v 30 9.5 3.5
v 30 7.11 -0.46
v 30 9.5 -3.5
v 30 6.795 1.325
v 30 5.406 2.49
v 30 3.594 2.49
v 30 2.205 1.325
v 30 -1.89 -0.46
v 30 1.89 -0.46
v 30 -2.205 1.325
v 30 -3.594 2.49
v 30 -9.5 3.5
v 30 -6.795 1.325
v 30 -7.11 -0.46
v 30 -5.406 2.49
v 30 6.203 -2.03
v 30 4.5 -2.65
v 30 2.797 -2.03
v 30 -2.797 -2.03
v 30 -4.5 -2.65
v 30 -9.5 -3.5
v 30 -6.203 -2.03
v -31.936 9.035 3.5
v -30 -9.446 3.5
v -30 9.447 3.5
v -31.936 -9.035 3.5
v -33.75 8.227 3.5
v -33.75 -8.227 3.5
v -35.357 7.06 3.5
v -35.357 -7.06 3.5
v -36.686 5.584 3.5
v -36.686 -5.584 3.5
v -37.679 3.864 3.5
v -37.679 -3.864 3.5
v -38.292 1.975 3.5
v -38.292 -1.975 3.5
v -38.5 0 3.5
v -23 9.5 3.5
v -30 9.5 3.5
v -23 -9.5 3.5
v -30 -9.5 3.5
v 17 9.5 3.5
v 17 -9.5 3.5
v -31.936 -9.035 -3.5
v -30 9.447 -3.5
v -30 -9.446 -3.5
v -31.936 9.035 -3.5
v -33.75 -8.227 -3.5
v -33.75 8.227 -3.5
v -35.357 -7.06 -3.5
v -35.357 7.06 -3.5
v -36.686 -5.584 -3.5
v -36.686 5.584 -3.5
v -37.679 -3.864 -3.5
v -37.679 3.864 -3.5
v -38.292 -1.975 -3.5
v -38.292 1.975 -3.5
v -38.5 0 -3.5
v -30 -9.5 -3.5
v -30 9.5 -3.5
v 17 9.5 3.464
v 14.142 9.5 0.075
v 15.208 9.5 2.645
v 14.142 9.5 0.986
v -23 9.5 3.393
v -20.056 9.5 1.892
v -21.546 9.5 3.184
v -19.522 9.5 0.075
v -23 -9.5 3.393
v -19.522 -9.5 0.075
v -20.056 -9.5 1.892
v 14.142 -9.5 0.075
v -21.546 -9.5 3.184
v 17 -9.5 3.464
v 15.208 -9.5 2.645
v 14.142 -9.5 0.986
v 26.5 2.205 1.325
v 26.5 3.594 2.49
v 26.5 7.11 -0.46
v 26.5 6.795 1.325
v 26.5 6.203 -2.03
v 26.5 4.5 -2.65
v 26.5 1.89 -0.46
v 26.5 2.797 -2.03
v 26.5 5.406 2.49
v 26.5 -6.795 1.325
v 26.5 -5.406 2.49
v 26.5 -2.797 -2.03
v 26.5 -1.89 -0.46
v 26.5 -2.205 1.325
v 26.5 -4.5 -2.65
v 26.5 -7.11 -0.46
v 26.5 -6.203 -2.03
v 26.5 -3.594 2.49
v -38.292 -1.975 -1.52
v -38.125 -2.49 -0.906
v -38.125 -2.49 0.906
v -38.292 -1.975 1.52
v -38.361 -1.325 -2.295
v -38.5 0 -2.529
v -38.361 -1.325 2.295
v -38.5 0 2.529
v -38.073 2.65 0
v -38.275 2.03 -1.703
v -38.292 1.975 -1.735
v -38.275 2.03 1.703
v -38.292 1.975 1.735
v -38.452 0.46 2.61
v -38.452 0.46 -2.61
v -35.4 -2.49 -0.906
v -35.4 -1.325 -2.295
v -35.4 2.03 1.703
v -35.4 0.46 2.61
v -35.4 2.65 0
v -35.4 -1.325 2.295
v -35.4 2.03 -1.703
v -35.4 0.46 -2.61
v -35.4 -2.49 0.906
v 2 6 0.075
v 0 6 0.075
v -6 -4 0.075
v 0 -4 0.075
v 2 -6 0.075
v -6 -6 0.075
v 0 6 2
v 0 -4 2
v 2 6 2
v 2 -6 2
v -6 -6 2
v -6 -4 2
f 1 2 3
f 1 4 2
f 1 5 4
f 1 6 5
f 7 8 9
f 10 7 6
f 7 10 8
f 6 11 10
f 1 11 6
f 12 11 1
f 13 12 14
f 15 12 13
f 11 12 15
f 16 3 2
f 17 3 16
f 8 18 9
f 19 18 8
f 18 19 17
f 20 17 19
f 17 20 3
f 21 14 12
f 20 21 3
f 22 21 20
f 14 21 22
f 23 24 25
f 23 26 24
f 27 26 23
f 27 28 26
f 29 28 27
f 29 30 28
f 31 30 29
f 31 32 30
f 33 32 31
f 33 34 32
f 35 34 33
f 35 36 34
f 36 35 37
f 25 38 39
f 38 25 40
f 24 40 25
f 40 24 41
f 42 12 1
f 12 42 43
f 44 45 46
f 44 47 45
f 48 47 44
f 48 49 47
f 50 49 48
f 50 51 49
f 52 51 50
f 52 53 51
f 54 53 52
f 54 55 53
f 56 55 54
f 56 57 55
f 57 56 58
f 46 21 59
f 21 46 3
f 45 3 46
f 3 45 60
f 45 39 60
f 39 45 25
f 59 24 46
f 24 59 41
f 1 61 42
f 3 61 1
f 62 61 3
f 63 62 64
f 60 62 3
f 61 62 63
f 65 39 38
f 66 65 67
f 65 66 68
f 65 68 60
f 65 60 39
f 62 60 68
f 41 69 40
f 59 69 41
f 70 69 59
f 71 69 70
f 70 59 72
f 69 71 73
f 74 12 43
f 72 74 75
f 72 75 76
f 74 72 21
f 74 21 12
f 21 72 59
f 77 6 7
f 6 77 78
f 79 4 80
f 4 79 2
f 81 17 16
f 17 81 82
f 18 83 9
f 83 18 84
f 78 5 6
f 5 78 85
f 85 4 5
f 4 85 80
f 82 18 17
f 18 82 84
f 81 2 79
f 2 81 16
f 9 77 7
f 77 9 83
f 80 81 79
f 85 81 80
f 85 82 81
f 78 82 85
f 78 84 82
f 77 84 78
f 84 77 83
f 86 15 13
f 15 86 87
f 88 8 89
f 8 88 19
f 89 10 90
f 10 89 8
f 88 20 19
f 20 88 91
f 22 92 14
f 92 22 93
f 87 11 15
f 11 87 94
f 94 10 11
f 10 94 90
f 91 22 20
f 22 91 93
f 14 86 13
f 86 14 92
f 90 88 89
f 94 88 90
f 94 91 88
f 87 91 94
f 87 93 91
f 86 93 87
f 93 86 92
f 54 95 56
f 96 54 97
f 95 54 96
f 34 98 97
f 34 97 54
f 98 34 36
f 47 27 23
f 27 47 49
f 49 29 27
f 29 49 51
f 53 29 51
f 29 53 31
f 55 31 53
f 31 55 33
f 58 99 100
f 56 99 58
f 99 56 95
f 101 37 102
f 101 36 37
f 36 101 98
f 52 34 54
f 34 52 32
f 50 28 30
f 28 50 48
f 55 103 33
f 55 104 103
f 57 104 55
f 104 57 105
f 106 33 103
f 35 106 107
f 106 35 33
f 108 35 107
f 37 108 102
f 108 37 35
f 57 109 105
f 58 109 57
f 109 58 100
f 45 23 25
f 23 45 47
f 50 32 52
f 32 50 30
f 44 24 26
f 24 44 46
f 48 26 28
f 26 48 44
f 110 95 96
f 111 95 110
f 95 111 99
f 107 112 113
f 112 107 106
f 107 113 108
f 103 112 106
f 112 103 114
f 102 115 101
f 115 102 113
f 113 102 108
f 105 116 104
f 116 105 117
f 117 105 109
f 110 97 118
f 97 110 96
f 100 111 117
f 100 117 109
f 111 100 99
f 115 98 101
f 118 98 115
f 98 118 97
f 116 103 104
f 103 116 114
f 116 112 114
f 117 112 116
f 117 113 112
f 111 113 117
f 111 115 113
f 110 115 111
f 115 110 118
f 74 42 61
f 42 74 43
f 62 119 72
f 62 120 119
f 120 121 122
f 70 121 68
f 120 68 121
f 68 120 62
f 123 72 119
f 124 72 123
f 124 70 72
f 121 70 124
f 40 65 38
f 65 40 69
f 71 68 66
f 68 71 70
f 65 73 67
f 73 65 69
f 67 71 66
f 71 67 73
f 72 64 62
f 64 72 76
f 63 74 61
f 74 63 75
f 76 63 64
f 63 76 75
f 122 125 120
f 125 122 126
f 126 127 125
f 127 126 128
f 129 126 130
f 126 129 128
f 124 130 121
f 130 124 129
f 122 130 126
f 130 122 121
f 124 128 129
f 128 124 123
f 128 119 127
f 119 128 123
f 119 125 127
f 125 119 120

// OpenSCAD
//Гуанин 
x=50;         
y=19;                                                         
z=7;
z2=2.5; //радиус отверстий
// по этой переменной можно менять толщину всей модели         
//Гуанин                          
difference(){
 union(){        
difference() {    
color("Red") cube ([x+10, y, z], center=true);
  #rotate([0, 90, 0]) translate([0, 4.5, 26.5]) cylinder(9, 2.65, 2.65);

  #rotate([0, 90, 0]) translate([0, -4.5, 26.5]) cylinder(9, 2.65, 2.65);        
}       

#color("Red") translate ([-29, y/200000, -3.5]) cylinder (z, y/2, y/2);
}                            
#rotate([90, 0, 90]) translate([0, 0, -44.4]) cylinder(9, 2.65, 2.65);

#translate([-3, 0, 2.5]) cube([40, 21, 4.85], center=true);

} 
rotate([90, 0, 0]) color("red") translate([-23, 0, -9.5]) cylinder(19, 3.5, 3.5);
rotate([90, 0, 0]) color("red") translate([17.5, 0, -9.5]) cylinder(19, 3.5, 3.5);
//буква Г
translate([-6, -6, 0,]) cube([6, 2, 2]);
translate([0, -6, 0,]) cube([2, 12, 2]);
  
  
  
  
